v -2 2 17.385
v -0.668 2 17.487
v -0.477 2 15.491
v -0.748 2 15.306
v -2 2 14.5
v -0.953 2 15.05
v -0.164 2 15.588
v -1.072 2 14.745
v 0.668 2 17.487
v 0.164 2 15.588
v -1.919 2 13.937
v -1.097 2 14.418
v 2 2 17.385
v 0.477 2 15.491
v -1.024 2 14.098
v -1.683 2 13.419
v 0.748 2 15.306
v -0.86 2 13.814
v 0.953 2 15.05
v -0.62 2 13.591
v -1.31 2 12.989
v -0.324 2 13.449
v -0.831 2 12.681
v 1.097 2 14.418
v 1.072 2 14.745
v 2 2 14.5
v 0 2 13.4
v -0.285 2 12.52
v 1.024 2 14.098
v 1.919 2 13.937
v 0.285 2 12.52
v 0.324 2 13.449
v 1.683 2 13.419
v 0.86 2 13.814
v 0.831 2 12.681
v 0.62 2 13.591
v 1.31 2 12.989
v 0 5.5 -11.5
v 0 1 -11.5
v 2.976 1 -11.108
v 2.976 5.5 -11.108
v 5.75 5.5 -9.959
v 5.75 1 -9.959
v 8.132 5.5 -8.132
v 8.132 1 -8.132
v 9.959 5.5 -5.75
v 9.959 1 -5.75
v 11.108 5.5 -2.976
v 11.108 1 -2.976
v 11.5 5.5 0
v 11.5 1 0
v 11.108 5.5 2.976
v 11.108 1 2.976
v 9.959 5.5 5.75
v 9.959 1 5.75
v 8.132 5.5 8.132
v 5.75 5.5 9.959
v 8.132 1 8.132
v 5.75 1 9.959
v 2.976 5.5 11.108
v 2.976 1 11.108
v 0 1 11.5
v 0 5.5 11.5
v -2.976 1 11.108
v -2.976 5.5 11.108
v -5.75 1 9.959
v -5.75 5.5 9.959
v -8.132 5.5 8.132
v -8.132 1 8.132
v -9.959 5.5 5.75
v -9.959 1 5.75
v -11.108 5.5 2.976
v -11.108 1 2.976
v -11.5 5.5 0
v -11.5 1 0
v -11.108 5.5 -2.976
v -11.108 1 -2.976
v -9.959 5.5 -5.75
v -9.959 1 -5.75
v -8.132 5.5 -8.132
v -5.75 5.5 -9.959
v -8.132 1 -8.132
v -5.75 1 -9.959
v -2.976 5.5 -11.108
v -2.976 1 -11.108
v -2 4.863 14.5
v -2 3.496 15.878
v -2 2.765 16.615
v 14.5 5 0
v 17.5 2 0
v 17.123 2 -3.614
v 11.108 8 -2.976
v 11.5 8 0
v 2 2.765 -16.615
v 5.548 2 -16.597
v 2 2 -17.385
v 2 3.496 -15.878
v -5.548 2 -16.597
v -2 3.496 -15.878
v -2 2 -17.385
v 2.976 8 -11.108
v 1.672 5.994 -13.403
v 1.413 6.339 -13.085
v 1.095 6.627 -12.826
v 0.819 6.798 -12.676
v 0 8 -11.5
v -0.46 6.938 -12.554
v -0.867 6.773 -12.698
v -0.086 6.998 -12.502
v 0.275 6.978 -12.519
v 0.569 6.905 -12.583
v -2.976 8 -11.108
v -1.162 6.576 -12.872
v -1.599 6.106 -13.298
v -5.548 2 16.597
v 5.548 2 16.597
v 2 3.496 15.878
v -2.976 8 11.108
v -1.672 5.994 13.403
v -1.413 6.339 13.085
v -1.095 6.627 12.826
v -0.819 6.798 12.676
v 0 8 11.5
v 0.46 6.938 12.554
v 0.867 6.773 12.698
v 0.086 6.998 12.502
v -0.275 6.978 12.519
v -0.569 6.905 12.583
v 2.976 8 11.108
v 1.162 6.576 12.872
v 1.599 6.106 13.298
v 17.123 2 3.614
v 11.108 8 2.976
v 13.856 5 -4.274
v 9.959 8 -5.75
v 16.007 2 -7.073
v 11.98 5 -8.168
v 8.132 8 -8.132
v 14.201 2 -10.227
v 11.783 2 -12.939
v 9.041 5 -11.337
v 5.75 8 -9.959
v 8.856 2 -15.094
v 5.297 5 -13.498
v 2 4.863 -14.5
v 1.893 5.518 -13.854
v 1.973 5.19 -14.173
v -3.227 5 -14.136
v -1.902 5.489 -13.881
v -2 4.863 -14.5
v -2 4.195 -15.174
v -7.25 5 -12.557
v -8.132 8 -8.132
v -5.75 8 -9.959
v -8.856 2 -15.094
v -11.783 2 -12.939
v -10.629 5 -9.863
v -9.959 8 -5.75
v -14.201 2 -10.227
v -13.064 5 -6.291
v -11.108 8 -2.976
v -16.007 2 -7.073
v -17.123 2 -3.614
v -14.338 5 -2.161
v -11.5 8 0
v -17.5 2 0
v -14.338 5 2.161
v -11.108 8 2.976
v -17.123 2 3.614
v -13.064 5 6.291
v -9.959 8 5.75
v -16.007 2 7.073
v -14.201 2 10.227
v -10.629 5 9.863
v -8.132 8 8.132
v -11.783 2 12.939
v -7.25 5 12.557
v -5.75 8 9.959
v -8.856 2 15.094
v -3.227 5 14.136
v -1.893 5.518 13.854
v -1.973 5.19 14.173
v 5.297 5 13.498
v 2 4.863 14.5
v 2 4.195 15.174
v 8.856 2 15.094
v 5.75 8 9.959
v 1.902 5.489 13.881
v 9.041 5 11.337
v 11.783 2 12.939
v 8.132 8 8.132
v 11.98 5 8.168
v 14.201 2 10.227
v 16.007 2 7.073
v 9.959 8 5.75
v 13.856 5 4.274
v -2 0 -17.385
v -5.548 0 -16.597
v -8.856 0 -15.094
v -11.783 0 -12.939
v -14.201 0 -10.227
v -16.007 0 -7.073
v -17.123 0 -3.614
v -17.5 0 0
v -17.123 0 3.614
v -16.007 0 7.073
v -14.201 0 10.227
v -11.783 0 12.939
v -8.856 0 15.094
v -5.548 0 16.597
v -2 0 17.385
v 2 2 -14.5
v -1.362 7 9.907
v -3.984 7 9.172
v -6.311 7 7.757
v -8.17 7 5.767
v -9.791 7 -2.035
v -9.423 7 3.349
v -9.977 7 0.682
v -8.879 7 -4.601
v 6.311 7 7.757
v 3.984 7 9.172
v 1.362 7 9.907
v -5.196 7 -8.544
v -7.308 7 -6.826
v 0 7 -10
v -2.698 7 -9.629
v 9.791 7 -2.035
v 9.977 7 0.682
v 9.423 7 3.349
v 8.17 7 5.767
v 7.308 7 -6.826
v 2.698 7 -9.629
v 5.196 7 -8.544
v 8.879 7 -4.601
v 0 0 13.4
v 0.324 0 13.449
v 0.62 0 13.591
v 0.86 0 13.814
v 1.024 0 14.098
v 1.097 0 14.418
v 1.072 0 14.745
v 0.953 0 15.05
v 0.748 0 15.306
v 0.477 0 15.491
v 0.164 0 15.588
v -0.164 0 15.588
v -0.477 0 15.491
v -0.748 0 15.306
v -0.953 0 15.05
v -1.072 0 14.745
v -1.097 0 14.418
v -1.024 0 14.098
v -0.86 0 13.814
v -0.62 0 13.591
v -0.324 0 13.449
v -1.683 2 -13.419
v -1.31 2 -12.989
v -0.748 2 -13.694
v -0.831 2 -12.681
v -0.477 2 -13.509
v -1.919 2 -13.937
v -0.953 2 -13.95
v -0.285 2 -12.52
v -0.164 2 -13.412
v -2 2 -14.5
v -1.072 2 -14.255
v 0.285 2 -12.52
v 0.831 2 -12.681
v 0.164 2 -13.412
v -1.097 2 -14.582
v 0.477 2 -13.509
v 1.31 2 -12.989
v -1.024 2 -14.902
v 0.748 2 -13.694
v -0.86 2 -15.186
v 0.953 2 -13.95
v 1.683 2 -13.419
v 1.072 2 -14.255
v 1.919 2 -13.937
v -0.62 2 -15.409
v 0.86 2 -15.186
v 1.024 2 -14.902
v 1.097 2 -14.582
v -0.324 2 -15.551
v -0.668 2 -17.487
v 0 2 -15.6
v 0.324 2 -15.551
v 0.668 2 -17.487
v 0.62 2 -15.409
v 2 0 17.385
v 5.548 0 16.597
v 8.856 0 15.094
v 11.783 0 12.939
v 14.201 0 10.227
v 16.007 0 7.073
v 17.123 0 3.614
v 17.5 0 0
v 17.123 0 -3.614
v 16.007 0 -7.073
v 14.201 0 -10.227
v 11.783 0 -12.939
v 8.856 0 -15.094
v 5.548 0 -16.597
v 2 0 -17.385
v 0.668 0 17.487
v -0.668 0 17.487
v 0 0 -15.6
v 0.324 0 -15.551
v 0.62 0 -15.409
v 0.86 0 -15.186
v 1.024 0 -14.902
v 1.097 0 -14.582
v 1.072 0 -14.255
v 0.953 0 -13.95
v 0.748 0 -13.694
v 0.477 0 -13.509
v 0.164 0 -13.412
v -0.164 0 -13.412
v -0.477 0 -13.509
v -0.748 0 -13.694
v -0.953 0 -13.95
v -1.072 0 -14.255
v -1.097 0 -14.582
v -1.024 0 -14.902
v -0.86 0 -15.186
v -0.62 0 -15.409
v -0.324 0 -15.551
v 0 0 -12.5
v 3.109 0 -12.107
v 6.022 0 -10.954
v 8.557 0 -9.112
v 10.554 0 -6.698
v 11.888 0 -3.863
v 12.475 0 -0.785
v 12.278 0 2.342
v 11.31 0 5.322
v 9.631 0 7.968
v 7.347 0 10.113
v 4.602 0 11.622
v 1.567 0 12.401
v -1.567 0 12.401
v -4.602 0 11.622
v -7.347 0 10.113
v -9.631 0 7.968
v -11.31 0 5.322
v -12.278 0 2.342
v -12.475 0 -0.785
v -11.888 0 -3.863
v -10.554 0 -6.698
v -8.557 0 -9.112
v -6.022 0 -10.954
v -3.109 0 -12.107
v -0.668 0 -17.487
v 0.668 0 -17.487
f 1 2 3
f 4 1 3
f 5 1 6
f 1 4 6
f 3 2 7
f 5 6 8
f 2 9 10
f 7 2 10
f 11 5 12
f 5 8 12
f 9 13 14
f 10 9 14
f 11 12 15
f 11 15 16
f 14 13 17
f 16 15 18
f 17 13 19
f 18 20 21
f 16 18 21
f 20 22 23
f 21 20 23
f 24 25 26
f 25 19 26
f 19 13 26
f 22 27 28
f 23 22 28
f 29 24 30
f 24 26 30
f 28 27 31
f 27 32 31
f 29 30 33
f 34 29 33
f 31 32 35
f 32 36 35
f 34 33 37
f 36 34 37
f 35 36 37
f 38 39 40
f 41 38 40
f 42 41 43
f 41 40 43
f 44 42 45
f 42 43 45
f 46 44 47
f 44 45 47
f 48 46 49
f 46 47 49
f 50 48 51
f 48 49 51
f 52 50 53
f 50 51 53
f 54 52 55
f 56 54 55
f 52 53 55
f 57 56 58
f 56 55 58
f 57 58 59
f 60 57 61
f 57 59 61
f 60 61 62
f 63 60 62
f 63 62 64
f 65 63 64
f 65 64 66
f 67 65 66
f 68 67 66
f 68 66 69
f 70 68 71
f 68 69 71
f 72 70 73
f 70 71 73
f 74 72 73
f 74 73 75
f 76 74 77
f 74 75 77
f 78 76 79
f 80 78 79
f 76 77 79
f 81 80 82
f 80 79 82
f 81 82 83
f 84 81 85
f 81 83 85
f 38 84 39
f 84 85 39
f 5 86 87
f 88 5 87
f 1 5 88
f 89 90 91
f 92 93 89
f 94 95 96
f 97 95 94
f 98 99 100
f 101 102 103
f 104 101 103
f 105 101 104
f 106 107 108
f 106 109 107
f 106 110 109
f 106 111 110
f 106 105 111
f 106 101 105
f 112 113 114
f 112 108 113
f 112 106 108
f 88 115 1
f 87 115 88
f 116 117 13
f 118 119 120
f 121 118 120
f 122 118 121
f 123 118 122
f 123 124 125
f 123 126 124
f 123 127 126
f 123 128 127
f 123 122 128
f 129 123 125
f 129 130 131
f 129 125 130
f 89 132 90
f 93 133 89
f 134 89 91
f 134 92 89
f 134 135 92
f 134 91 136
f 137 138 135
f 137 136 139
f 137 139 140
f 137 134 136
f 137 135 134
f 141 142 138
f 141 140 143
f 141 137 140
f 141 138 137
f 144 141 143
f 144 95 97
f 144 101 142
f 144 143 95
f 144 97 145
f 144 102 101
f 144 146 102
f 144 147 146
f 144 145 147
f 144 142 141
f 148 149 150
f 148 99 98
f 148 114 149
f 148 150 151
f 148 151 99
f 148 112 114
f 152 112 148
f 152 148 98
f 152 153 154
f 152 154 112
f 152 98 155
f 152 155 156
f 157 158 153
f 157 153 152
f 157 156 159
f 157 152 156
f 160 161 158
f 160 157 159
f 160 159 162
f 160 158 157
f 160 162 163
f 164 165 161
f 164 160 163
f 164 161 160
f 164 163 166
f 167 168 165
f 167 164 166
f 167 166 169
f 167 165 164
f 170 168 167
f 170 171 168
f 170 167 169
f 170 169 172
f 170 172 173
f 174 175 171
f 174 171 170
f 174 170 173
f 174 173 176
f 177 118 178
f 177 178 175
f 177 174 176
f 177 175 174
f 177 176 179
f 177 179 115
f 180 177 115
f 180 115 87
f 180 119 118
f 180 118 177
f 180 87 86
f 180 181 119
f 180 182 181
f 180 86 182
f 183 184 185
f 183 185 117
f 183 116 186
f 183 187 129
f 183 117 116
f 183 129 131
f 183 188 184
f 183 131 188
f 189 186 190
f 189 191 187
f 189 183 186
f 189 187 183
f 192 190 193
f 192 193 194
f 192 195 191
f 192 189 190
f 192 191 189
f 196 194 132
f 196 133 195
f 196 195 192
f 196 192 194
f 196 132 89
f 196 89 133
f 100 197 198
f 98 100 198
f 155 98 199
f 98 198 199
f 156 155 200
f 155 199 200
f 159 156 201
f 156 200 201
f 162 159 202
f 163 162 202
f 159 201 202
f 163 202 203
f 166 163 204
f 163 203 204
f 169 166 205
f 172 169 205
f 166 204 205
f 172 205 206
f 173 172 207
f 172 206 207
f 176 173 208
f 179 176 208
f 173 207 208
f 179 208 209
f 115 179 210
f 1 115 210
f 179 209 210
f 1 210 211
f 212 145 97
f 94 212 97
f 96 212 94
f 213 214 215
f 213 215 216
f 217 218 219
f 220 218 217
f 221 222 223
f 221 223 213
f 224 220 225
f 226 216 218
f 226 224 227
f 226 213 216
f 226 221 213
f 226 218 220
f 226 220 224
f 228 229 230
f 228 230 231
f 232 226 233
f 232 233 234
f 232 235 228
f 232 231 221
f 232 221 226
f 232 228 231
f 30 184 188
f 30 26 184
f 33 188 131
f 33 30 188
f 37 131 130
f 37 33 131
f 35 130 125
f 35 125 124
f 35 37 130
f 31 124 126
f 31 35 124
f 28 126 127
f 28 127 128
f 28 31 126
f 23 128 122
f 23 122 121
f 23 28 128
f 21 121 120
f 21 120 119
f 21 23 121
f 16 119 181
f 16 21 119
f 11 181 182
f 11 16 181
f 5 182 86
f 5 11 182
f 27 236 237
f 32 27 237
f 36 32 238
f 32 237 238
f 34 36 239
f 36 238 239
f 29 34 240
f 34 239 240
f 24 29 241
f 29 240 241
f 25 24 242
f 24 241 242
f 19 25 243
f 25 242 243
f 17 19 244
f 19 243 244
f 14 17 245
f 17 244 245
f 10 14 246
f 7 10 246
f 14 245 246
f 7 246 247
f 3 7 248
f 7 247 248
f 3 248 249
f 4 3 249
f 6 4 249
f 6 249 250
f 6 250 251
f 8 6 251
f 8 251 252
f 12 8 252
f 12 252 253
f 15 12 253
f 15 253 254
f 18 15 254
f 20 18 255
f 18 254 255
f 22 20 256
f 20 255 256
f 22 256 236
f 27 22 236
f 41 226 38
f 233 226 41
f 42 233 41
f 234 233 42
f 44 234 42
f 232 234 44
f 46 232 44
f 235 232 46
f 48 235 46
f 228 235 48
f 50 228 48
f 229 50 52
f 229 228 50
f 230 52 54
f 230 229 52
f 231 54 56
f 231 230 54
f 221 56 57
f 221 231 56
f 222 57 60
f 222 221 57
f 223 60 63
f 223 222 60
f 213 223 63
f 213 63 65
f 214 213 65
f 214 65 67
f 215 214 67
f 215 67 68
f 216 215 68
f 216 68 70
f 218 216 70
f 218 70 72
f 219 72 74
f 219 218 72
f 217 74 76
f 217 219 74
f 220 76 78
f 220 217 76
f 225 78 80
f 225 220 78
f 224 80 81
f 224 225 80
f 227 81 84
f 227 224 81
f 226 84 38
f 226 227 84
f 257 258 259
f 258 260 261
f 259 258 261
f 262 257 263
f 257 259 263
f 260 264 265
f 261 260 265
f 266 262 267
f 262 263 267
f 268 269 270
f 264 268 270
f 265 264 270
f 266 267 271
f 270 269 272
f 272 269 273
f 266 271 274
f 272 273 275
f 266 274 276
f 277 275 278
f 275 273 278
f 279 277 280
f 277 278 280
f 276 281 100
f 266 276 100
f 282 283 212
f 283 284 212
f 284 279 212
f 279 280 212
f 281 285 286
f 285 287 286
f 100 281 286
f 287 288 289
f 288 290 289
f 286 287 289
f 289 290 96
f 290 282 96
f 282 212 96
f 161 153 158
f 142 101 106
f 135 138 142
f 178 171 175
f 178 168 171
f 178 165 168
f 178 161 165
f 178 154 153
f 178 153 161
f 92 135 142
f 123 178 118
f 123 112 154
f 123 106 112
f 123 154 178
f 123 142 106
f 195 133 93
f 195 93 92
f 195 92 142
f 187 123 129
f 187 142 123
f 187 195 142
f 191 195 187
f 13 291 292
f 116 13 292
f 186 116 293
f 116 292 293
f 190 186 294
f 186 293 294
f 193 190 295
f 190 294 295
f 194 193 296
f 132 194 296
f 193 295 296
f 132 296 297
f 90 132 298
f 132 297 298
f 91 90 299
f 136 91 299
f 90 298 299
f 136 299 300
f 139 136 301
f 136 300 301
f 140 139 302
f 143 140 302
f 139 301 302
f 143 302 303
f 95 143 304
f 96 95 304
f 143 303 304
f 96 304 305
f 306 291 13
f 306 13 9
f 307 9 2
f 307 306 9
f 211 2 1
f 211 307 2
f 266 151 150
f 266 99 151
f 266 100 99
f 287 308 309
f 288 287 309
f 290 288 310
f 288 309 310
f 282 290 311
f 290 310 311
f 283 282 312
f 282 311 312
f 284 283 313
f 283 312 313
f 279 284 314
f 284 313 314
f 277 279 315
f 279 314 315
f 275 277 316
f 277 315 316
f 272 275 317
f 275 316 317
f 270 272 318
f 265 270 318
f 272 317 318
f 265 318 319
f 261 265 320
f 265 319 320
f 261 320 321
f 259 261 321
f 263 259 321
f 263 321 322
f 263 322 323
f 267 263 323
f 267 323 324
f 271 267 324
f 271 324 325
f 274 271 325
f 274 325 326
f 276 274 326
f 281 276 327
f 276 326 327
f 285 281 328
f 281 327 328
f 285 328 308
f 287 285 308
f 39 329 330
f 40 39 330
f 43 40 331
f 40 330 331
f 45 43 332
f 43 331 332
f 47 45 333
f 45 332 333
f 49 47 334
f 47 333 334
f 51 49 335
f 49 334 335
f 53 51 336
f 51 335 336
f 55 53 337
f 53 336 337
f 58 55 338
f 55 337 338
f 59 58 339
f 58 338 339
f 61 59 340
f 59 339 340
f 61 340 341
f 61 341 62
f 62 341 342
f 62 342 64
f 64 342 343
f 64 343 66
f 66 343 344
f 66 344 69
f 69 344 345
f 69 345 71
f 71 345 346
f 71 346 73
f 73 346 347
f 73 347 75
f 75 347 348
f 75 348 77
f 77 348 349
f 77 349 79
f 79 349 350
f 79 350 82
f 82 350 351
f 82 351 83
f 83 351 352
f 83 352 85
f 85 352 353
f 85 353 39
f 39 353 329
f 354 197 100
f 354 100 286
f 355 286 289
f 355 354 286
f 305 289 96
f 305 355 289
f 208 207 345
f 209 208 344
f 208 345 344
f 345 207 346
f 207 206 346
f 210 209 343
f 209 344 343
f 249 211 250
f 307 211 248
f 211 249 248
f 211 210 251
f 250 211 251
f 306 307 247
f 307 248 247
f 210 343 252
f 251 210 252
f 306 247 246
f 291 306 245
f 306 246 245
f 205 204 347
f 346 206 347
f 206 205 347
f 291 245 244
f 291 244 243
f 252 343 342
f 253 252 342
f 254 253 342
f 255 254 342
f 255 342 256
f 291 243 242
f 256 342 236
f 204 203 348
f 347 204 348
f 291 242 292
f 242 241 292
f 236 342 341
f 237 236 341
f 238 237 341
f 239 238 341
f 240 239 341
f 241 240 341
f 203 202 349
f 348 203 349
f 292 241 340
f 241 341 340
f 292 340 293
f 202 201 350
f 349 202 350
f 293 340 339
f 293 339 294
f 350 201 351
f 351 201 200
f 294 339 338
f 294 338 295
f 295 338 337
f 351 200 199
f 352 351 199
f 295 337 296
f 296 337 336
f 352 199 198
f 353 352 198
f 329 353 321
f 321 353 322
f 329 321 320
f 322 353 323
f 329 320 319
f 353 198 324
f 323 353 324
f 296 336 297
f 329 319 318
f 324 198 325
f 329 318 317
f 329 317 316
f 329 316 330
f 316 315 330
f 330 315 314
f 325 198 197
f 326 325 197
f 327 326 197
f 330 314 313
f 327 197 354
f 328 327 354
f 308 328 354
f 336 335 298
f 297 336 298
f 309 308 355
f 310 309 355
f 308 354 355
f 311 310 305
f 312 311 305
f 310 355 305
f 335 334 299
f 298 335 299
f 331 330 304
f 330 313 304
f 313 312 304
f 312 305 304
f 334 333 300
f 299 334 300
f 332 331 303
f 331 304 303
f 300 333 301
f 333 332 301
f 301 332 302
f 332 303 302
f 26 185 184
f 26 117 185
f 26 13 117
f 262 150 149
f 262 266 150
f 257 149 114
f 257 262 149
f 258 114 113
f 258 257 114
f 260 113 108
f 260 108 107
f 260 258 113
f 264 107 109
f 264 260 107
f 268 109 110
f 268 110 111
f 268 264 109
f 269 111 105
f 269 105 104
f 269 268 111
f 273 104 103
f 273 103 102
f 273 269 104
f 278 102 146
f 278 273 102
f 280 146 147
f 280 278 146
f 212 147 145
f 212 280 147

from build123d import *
from build123d.topology import SkipClean

# Parameters (mm, degrees)
BOSS_EXTRUDE1_DEPTH = 2
SKETCH2_R           = 11.5
BOSS_EXTRUDE2_DEPTH = 6
CHAMFER1_START      = 2
CHAMFER1_2_DEPTH    = 6
SKETCH6_R           = 17.5
SKETCH6_R_2         = 1.1
BOSS_EXTRUDE3_DEPTH = 2
SKETCH7_R           = 11.5
CUT_EXTRUDE1_DEPTH  = 7
CHAMFER2_SIZE       = 1.5
CHAMFER3_SIZE       = 1


with BuildPart() as part:
    # Sketch1 → Boss-Extrude1 (new body)
    with BuildSketch(Plane(origin=(0, 0, 0), x_dir=(1, 0, 0), z_dir=(0, 1, 0))):
        with BuildLine():
            Line((-2, 14.5), (-2, 17.385338651))
            ThreePointArc((-2, 17.385338651), (-17.5, 0), (-2, -17.385338651))
            Line((-2, -17.385338651), (-2, -14.5))
            ThreePointArc((-2, -14.5), (0, -12.5), (2, -14.5))
            Line((2, -14.5), (2, -17.385338651))
            ThreePointArc((2, -17.385338651), (17.5, 0), (2, 17.385338651))
            Line((2, 17.385338651), (2, 14.5))
            ThreePointArc((2, 14.5), (0, 12.5), (-2, 14.5))
        make_face()
    extrude(amount=BOSS_EXTRUDE1_DEPTH)

    # Sketch2 → Boss-Extrude2 (add)
    with BuildSketch(Plane(origin=(0, 2, 0), x_dir=(1, 0, 0), z_dir=(0, 1, 0))):
        with Locations(Location((0, 0, 0), (0, 0, 270))):
            Circle(SKETCH2_R)
    extrude(amount=BOSS_EXTRUDE2_DEPTH)

    # Chamfer1: read off the stored shape, not the designer's step
    # Chamfer1 outline → Chamfer1 (revolve)
    with BuildSketch(Plane.XY):
        Polygon((17.5, 2), (11.5, 8), (11.5, 2), align=None)
    revolve(axis=Axis((0, 0, 0), (0, 1, 0)))

    # Chamfer1 2 outline → Chamfer1 2 (cut)
    with BuildSketch(Plane(origin=(0, 0, 0), x_dir=(1, 0, 0), z_dir=(0, 1, 0)).offset(CHAMFER1_START)):
        with BuildLine():
            ThreePointArc((2, -14.5), (0, -12.5), (-2, -14.5))
            Line((-2, -14.5), (-2, -19))
            Line((-2, -19), (2, -19))
            Line((2, -19), (2, -14.5))
        make_face()
        with BuildLine():
            Line((2, 19), (-2, 19))
            Line((-2, 19), (-2, 14.5))
            ThreePointArc((-2, 14.5), (0, 12.5), (2, 14.5))
            Line((2, 14.5), (2, 19))
        make_face()
    extrude(amount=CHAMFER1_2_DEPTH, mode=Mode.SUBTRACT)

    # Sketch6 → Boss-Extrude3 (add)
    with SkipClean():  # the faces are left unmerged after this step: merging them gives an invalid solid
        with BuildSketch(Plane.XZ):
            with Locations(Location((0, 0, 0), (0, 0, 263.437572131))):
                Circle(SKETCH6_R)
            with Locations(Location((0, 14.5, 0), (0, 0, 270))):
                Circle(SKETCH6_R_2, mode=Mode.SUBTRACT)
            with Locations(Location((0, -14.5, 0), (0, 0, 270))):
                Circle(SKETCH6_R_2, mode=Mode.SUBTRACT)
        extrude(amount=-BOSS_EXTRUDE3_DEPTH)

    # Sketch7 → Cut-Extrude1 (cut)
    with SkipClean():  # the faces are left unmerged after this step: merging them gives an invalid solid
        with BuildSketch(Plane.XZ):
            with Locations(Location((0, 0, 0), (0, 0, 270))):
                Circle(SKETCH7_R)
        extrude(amount=-CUT_EXTRUDE1_DEPTH, mode=Mode.SUBTRACT)

    # Chamfer2
    chamfer2_edges = [part.edges().sort_by_distance(p)[0] for p in [
        (0, 7, 11.5),
    ]]
    chamfer(chamfer2_edges, length=CHAMFER2_SIZE)

    # Chamfer3
    chamfer3_edges = [part.edges().sort_by_distance(p)[0] for p in [
        (0, 0, 11.5),
    ]]
    chamfer(chamfer3_edges, length=CHAMFER3_SIZE - 0.0001)  # a hair under: the kernel refuses the full size


solid = part.part
